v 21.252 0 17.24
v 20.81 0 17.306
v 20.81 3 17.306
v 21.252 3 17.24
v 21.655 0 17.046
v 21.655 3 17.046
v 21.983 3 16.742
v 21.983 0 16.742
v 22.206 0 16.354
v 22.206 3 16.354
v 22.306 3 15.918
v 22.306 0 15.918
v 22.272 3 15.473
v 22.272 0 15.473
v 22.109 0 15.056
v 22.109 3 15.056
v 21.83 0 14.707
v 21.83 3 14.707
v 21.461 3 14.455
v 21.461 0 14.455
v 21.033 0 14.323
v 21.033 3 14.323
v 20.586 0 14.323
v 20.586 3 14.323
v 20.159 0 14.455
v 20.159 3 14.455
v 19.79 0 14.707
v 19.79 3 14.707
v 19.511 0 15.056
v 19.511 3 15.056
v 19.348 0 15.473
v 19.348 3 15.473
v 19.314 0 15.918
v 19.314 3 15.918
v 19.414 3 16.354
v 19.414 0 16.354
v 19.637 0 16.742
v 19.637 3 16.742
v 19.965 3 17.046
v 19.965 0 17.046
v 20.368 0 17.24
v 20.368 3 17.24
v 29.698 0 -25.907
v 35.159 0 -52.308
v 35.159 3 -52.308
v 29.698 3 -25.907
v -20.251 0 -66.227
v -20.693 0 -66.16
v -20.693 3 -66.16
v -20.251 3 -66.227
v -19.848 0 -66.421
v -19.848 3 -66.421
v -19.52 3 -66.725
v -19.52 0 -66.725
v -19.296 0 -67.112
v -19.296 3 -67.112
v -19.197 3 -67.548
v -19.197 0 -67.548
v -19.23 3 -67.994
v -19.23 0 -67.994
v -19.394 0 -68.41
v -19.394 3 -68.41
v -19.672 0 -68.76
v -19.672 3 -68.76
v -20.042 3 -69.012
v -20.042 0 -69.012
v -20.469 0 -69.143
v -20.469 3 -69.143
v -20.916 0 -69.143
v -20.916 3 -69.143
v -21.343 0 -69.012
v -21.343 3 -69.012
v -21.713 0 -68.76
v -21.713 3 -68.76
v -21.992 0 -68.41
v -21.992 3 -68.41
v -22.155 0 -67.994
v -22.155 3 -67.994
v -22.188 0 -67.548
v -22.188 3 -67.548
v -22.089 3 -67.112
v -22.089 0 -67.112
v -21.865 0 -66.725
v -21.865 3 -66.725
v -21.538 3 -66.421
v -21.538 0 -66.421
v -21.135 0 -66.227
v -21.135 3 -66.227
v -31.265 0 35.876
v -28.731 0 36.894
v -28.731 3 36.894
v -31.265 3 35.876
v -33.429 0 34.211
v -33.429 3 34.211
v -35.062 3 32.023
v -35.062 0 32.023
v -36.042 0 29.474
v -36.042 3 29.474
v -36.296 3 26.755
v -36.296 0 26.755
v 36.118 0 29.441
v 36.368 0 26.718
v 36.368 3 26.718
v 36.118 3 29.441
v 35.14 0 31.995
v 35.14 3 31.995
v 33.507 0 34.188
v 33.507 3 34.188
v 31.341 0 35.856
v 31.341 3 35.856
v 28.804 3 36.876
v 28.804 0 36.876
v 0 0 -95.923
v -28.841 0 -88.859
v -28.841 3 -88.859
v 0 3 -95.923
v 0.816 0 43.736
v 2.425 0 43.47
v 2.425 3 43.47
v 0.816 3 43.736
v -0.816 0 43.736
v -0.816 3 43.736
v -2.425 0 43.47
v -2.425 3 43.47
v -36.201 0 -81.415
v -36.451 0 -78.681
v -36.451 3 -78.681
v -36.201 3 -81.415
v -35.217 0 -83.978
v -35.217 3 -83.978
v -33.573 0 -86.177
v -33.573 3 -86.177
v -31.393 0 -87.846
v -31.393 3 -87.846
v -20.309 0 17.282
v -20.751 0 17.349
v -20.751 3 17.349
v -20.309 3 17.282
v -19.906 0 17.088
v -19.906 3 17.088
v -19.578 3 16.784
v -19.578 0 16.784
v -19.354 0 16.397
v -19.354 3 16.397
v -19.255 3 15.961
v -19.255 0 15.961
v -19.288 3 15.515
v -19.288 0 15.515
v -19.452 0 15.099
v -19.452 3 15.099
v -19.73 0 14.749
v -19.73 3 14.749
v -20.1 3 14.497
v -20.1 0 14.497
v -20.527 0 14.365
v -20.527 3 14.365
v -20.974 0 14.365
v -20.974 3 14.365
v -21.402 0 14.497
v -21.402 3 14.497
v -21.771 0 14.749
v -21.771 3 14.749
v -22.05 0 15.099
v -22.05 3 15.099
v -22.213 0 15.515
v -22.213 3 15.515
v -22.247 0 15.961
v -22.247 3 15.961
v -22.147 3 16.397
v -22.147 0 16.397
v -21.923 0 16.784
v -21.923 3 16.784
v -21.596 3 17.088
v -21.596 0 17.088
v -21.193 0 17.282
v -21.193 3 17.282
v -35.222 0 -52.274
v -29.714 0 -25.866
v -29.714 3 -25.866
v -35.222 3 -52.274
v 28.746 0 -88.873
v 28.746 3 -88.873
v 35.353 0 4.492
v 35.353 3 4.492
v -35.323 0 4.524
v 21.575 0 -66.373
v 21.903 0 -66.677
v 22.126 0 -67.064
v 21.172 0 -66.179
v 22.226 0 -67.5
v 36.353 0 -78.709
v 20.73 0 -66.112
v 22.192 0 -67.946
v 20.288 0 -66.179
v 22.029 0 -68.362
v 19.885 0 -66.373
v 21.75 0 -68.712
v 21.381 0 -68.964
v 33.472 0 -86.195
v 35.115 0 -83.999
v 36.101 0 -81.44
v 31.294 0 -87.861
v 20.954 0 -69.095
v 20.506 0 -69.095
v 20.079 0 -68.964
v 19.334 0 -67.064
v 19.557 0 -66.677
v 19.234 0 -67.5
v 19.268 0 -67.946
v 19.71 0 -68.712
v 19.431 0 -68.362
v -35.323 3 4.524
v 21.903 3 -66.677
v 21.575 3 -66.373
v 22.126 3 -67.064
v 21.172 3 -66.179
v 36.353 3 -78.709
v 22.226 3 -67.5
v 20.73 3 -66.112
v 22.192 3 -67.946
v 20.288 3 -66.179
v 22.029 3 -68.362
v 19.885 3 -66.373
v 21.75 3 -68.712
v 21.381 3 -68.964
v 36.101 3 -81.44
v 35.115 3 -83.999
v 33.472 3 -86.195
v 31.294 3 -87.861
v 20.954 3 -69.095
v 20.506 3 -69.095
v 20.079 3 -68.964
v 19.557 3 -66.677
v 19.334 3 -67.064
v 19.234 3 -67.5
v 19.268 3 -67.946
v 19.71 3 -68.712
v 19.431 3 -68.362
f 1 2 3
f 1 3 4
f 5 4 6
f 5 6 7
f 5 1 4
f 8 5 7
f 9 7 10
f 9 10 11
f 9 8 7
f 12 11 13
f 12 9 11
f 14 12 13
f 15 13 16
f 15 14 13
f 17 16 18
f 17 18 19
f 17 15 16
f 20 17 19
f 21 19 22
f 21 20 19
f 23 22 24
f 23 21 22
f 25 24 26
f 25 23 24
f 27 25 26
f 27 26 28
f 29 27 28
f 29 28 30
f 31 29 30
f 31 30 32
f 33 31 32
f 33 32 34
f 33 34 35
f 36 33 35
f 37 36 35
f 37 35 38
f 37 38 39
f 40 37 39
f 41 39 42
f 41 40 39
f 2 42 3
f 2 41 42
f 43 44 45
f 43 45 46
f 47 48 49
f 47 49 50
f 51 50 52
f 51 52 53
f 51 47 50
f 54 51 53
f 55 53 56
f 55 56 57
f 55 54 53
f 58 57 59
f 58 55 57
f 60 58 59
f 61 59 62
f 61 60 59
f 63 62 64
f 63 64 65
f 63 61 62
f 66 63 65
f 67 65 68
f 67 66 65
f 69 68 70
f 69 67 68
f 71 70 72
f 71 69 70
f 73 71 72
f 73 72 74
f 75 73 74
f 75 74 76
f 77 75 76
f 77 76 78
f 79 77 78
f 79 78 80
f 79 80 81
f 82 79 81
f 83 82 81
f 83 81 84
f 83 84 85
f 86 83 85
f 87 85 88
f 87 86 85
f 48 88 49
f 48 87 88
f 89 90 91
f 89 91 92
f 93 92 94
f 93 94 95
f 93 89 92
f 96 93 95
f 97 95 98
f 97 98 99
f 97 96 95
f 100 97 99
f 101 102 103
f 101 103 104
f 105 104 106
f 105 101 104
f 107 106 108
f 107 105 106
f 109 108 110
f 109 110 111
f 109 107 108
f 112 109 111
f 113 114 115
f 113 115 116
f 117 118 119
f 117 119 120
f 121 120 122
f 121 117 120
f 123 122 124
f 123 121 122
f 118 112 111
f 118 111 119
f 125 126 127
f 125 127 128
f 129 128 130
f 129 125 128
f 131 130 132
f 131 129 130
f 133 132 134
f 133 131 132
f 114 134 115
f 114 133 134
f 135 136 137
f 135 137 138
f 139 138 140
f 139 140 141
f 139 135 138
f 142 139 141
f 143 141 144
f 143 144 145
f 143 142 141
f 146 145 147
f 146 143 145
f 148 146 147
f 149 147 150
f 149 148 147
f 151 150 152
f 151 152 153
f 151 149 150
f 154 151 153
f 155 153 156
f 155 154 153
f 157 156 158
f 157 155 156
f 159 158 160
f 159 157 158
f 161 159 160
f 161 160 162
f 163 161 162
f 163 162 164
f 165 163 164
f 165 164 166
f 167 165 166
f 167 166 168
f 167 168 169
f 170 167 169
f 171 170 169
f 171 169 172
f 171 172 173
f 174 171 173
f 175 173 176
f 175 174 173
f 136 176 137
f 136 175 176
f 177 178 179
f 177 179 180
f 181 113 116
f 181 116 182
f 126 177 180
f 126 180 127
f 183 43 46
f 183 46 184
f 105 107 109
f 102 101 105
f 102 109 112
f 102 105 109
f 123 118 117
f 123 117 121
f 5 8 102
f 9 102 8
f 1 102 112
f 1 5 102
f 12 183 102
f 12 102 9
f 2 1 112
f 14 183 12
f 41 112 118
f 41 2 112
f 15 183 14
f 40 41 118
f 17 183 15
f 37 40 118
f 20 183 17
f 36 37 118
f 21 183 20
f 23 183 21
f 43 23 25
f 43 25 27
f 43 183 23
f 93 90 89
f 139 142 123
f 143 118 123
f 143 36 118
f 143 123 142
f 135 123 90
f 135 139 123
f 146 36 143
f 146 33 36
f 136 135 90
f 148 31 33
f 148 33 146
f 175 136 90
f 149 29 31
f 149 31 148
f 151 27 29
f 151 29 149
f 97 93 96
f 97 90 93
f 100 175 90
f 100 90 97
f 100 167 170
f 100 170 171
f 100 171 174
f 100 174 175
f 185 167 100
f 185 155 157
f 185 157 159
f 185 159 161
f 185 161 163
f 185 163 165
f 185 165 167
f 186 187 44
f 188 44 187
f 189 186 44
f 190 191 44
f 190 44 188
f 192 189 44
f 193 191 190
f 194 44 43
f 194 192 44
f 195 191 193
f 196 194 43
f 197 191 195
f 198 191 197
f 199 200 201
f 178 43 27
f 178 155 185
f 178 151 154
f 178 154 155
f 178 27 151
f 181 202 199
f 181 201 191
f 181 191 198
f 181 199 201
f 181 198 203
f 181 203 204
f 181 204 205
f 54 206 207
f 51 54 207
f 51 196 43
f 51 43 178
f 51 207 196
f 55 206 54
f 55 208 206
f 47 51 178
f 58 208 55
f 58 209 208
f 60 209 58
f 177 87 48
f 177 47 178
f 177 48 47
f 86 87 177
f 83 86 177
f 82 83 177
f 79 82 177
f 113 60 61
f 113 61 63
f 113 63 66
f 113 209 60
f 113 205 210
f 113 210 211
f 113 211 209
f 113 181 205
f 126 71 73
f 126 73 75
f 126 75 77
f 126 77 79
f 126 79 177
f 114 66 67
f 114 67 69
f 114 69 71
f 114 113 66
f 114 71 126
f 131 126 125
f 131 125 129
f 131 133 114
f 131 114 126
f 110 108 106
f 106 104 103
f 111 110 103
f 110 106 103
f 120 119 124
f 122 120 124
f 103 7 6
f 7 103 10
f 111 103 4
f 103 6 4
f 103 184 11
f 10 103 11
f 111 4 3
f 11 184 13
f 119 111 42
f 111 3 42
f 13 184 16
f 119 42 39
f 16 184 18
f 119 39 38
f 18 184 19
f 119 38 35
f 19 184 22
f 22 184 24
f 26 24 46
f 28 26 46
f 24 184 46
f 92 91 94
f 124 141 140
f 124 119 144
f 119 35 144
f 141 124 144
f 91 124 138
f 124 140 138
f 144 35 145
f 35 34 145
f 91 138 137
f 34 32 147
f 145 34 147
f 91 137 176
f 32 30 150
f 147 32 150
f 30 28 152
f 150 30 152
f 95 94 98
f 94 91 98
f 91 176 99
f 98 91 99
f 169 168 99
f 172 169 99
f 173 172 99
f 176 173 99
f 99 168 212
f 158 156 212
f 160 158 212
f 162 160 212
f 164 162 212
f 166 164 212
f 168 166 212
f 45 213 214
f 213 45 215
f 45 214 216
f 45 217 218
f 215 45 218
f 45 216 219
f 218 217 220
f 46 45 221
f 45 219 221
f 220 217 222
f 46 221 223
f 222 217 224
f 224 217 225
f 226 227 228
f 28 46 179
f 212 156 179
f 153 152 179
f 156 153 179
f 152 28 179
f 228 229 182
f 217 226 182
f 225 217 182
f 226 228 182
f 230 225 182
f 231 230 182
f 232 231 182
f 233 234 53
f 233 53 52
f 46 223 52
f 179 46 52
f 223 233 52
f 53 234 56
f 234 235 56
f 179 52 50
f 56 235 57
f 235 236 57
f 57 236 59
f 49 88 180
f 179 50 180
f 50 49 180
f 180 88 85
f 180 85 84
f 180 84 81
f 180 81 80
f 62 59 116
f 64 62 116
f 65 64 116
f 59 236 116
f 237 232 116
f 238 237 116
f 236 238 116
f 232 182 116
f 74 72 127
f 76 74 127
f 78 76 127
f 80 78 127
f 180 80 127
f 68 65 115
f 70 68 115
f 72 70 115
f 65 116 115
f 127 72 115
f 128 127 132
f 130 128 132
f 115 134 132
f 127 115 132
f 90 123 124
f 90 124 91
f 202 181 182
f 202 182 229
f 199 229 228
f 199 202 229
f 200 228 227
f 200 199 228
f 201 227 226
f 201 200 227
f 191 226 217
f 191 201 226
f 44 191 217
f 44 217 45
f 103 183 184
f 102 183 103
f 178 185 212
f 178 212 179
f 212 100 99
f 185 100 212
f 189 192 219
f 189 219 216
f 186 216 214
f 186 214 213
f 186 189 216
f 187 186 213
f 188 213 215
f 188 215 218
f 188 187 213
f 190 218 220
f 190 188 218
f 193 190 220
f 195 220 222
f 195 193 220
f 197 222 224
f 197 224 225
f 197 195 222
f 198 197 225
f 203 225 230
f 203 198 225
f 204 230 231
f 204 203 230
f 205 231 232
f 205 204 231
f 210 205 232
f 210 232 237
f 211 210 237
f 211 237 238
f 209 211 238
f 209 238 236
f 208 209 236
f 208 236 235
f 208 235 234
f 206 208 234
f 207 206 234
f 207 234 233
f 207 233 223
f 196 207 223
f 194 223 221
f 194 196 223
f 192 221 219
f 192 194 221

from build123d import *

# Parameters (mm, degrees)
CROQUIS1_R              = 1.5
SALIENTE_EXTRUIR1_DEPTH = 3


with BuildPart() as part:
    # Croquis1 → Saliente-Extruir1 (new body)
    with BuildSketch(Plane(origin=(0, 0, 0), x_dir=(1, 0, 0), z_dir=(0, 1, 0))):
        with BuildLine():
            Line((-35.322649353, -4.523785763), (-29.713798408, 25.866039525))
            Line((-29.713798408, 25.866039525), (-35.221795469, 52.273603799))
            Line((-35.221795469, 52.273603799), (-36.45117663, 78.681168073))
            ThreePointArc((-36.45117663, 78.681168073), (-34.470773885, 85.134483293), (-28.840989272, 88.859103754))
            Line((-28.840989272, 88.859103754), (0, 95.923167849))
            Line((0, 95.923167849), (28.745582144, 88.873347738))
            ThreePointArc((28.745582144, 88.873347738), (34.369430491, 85.153487685), (36.353462125, 78.709215227))
            Line((36.353462125, 78.709215227), (35.159044734, 52.307970662))
            Line((35.159044734, 52.307970662), (29.69822954, 25.906726097))
            Line((29.69822954, 25.906726097), (35.352965357, -4.492390106))
            Line((35.352965357, -4.492390106), (36.368027066, -26.718230301))
            ThreePointArc((36.368027066, -26.718230301), (34.398862632, -33.147130574), (28.803795931, -36.875883169))
            Line((28.803795931, -36.875883169), (2.42535625, -43.470493089))
            ThreePointArc((2.42535625, -43.470493089), (0, -43.769068087), (-2.42535625, -43.470493089))
            Line((-2.42535625, -43.470493089), (-28.730703822, -36.894156196))
            ThreePointArc((-28.730703822, -36.894156196), (-34.320110297, -33.172996946), (-36.295781209, -26.755426116))
            Line((-36.295781209, -26.755426116), (-35.322649353, -4.523785763))
        make_face()
        with Locations(Location((-20.692659667, 67.660143415, 0), (0, 0, 270))):
            Circle(CROQUIS1_R, mode=Mode.SUBTRACT)
        with Locations(Location((20.730030015, 67.612237294, 0), (0, 0, 270))):
            Circle(CROQUIS1_R, mode=Mode.SUBTRACT)
        with Locations(Location((-20.750709845, -15.848615277, 0), (0, 0, 270))):
            Circle(CROQUIS1_R, mode=Mode.SUBTRACT)
        with Locations(Location((20.809934934, -15.806357426, 0), (0, 0, 270))):
            Circle(CROQUIS1_R, mode=Mode.SUBTRACT)
    extrude(amount=SALIENTE_EXTRUIR1_DEPTH)


solid = part.part
